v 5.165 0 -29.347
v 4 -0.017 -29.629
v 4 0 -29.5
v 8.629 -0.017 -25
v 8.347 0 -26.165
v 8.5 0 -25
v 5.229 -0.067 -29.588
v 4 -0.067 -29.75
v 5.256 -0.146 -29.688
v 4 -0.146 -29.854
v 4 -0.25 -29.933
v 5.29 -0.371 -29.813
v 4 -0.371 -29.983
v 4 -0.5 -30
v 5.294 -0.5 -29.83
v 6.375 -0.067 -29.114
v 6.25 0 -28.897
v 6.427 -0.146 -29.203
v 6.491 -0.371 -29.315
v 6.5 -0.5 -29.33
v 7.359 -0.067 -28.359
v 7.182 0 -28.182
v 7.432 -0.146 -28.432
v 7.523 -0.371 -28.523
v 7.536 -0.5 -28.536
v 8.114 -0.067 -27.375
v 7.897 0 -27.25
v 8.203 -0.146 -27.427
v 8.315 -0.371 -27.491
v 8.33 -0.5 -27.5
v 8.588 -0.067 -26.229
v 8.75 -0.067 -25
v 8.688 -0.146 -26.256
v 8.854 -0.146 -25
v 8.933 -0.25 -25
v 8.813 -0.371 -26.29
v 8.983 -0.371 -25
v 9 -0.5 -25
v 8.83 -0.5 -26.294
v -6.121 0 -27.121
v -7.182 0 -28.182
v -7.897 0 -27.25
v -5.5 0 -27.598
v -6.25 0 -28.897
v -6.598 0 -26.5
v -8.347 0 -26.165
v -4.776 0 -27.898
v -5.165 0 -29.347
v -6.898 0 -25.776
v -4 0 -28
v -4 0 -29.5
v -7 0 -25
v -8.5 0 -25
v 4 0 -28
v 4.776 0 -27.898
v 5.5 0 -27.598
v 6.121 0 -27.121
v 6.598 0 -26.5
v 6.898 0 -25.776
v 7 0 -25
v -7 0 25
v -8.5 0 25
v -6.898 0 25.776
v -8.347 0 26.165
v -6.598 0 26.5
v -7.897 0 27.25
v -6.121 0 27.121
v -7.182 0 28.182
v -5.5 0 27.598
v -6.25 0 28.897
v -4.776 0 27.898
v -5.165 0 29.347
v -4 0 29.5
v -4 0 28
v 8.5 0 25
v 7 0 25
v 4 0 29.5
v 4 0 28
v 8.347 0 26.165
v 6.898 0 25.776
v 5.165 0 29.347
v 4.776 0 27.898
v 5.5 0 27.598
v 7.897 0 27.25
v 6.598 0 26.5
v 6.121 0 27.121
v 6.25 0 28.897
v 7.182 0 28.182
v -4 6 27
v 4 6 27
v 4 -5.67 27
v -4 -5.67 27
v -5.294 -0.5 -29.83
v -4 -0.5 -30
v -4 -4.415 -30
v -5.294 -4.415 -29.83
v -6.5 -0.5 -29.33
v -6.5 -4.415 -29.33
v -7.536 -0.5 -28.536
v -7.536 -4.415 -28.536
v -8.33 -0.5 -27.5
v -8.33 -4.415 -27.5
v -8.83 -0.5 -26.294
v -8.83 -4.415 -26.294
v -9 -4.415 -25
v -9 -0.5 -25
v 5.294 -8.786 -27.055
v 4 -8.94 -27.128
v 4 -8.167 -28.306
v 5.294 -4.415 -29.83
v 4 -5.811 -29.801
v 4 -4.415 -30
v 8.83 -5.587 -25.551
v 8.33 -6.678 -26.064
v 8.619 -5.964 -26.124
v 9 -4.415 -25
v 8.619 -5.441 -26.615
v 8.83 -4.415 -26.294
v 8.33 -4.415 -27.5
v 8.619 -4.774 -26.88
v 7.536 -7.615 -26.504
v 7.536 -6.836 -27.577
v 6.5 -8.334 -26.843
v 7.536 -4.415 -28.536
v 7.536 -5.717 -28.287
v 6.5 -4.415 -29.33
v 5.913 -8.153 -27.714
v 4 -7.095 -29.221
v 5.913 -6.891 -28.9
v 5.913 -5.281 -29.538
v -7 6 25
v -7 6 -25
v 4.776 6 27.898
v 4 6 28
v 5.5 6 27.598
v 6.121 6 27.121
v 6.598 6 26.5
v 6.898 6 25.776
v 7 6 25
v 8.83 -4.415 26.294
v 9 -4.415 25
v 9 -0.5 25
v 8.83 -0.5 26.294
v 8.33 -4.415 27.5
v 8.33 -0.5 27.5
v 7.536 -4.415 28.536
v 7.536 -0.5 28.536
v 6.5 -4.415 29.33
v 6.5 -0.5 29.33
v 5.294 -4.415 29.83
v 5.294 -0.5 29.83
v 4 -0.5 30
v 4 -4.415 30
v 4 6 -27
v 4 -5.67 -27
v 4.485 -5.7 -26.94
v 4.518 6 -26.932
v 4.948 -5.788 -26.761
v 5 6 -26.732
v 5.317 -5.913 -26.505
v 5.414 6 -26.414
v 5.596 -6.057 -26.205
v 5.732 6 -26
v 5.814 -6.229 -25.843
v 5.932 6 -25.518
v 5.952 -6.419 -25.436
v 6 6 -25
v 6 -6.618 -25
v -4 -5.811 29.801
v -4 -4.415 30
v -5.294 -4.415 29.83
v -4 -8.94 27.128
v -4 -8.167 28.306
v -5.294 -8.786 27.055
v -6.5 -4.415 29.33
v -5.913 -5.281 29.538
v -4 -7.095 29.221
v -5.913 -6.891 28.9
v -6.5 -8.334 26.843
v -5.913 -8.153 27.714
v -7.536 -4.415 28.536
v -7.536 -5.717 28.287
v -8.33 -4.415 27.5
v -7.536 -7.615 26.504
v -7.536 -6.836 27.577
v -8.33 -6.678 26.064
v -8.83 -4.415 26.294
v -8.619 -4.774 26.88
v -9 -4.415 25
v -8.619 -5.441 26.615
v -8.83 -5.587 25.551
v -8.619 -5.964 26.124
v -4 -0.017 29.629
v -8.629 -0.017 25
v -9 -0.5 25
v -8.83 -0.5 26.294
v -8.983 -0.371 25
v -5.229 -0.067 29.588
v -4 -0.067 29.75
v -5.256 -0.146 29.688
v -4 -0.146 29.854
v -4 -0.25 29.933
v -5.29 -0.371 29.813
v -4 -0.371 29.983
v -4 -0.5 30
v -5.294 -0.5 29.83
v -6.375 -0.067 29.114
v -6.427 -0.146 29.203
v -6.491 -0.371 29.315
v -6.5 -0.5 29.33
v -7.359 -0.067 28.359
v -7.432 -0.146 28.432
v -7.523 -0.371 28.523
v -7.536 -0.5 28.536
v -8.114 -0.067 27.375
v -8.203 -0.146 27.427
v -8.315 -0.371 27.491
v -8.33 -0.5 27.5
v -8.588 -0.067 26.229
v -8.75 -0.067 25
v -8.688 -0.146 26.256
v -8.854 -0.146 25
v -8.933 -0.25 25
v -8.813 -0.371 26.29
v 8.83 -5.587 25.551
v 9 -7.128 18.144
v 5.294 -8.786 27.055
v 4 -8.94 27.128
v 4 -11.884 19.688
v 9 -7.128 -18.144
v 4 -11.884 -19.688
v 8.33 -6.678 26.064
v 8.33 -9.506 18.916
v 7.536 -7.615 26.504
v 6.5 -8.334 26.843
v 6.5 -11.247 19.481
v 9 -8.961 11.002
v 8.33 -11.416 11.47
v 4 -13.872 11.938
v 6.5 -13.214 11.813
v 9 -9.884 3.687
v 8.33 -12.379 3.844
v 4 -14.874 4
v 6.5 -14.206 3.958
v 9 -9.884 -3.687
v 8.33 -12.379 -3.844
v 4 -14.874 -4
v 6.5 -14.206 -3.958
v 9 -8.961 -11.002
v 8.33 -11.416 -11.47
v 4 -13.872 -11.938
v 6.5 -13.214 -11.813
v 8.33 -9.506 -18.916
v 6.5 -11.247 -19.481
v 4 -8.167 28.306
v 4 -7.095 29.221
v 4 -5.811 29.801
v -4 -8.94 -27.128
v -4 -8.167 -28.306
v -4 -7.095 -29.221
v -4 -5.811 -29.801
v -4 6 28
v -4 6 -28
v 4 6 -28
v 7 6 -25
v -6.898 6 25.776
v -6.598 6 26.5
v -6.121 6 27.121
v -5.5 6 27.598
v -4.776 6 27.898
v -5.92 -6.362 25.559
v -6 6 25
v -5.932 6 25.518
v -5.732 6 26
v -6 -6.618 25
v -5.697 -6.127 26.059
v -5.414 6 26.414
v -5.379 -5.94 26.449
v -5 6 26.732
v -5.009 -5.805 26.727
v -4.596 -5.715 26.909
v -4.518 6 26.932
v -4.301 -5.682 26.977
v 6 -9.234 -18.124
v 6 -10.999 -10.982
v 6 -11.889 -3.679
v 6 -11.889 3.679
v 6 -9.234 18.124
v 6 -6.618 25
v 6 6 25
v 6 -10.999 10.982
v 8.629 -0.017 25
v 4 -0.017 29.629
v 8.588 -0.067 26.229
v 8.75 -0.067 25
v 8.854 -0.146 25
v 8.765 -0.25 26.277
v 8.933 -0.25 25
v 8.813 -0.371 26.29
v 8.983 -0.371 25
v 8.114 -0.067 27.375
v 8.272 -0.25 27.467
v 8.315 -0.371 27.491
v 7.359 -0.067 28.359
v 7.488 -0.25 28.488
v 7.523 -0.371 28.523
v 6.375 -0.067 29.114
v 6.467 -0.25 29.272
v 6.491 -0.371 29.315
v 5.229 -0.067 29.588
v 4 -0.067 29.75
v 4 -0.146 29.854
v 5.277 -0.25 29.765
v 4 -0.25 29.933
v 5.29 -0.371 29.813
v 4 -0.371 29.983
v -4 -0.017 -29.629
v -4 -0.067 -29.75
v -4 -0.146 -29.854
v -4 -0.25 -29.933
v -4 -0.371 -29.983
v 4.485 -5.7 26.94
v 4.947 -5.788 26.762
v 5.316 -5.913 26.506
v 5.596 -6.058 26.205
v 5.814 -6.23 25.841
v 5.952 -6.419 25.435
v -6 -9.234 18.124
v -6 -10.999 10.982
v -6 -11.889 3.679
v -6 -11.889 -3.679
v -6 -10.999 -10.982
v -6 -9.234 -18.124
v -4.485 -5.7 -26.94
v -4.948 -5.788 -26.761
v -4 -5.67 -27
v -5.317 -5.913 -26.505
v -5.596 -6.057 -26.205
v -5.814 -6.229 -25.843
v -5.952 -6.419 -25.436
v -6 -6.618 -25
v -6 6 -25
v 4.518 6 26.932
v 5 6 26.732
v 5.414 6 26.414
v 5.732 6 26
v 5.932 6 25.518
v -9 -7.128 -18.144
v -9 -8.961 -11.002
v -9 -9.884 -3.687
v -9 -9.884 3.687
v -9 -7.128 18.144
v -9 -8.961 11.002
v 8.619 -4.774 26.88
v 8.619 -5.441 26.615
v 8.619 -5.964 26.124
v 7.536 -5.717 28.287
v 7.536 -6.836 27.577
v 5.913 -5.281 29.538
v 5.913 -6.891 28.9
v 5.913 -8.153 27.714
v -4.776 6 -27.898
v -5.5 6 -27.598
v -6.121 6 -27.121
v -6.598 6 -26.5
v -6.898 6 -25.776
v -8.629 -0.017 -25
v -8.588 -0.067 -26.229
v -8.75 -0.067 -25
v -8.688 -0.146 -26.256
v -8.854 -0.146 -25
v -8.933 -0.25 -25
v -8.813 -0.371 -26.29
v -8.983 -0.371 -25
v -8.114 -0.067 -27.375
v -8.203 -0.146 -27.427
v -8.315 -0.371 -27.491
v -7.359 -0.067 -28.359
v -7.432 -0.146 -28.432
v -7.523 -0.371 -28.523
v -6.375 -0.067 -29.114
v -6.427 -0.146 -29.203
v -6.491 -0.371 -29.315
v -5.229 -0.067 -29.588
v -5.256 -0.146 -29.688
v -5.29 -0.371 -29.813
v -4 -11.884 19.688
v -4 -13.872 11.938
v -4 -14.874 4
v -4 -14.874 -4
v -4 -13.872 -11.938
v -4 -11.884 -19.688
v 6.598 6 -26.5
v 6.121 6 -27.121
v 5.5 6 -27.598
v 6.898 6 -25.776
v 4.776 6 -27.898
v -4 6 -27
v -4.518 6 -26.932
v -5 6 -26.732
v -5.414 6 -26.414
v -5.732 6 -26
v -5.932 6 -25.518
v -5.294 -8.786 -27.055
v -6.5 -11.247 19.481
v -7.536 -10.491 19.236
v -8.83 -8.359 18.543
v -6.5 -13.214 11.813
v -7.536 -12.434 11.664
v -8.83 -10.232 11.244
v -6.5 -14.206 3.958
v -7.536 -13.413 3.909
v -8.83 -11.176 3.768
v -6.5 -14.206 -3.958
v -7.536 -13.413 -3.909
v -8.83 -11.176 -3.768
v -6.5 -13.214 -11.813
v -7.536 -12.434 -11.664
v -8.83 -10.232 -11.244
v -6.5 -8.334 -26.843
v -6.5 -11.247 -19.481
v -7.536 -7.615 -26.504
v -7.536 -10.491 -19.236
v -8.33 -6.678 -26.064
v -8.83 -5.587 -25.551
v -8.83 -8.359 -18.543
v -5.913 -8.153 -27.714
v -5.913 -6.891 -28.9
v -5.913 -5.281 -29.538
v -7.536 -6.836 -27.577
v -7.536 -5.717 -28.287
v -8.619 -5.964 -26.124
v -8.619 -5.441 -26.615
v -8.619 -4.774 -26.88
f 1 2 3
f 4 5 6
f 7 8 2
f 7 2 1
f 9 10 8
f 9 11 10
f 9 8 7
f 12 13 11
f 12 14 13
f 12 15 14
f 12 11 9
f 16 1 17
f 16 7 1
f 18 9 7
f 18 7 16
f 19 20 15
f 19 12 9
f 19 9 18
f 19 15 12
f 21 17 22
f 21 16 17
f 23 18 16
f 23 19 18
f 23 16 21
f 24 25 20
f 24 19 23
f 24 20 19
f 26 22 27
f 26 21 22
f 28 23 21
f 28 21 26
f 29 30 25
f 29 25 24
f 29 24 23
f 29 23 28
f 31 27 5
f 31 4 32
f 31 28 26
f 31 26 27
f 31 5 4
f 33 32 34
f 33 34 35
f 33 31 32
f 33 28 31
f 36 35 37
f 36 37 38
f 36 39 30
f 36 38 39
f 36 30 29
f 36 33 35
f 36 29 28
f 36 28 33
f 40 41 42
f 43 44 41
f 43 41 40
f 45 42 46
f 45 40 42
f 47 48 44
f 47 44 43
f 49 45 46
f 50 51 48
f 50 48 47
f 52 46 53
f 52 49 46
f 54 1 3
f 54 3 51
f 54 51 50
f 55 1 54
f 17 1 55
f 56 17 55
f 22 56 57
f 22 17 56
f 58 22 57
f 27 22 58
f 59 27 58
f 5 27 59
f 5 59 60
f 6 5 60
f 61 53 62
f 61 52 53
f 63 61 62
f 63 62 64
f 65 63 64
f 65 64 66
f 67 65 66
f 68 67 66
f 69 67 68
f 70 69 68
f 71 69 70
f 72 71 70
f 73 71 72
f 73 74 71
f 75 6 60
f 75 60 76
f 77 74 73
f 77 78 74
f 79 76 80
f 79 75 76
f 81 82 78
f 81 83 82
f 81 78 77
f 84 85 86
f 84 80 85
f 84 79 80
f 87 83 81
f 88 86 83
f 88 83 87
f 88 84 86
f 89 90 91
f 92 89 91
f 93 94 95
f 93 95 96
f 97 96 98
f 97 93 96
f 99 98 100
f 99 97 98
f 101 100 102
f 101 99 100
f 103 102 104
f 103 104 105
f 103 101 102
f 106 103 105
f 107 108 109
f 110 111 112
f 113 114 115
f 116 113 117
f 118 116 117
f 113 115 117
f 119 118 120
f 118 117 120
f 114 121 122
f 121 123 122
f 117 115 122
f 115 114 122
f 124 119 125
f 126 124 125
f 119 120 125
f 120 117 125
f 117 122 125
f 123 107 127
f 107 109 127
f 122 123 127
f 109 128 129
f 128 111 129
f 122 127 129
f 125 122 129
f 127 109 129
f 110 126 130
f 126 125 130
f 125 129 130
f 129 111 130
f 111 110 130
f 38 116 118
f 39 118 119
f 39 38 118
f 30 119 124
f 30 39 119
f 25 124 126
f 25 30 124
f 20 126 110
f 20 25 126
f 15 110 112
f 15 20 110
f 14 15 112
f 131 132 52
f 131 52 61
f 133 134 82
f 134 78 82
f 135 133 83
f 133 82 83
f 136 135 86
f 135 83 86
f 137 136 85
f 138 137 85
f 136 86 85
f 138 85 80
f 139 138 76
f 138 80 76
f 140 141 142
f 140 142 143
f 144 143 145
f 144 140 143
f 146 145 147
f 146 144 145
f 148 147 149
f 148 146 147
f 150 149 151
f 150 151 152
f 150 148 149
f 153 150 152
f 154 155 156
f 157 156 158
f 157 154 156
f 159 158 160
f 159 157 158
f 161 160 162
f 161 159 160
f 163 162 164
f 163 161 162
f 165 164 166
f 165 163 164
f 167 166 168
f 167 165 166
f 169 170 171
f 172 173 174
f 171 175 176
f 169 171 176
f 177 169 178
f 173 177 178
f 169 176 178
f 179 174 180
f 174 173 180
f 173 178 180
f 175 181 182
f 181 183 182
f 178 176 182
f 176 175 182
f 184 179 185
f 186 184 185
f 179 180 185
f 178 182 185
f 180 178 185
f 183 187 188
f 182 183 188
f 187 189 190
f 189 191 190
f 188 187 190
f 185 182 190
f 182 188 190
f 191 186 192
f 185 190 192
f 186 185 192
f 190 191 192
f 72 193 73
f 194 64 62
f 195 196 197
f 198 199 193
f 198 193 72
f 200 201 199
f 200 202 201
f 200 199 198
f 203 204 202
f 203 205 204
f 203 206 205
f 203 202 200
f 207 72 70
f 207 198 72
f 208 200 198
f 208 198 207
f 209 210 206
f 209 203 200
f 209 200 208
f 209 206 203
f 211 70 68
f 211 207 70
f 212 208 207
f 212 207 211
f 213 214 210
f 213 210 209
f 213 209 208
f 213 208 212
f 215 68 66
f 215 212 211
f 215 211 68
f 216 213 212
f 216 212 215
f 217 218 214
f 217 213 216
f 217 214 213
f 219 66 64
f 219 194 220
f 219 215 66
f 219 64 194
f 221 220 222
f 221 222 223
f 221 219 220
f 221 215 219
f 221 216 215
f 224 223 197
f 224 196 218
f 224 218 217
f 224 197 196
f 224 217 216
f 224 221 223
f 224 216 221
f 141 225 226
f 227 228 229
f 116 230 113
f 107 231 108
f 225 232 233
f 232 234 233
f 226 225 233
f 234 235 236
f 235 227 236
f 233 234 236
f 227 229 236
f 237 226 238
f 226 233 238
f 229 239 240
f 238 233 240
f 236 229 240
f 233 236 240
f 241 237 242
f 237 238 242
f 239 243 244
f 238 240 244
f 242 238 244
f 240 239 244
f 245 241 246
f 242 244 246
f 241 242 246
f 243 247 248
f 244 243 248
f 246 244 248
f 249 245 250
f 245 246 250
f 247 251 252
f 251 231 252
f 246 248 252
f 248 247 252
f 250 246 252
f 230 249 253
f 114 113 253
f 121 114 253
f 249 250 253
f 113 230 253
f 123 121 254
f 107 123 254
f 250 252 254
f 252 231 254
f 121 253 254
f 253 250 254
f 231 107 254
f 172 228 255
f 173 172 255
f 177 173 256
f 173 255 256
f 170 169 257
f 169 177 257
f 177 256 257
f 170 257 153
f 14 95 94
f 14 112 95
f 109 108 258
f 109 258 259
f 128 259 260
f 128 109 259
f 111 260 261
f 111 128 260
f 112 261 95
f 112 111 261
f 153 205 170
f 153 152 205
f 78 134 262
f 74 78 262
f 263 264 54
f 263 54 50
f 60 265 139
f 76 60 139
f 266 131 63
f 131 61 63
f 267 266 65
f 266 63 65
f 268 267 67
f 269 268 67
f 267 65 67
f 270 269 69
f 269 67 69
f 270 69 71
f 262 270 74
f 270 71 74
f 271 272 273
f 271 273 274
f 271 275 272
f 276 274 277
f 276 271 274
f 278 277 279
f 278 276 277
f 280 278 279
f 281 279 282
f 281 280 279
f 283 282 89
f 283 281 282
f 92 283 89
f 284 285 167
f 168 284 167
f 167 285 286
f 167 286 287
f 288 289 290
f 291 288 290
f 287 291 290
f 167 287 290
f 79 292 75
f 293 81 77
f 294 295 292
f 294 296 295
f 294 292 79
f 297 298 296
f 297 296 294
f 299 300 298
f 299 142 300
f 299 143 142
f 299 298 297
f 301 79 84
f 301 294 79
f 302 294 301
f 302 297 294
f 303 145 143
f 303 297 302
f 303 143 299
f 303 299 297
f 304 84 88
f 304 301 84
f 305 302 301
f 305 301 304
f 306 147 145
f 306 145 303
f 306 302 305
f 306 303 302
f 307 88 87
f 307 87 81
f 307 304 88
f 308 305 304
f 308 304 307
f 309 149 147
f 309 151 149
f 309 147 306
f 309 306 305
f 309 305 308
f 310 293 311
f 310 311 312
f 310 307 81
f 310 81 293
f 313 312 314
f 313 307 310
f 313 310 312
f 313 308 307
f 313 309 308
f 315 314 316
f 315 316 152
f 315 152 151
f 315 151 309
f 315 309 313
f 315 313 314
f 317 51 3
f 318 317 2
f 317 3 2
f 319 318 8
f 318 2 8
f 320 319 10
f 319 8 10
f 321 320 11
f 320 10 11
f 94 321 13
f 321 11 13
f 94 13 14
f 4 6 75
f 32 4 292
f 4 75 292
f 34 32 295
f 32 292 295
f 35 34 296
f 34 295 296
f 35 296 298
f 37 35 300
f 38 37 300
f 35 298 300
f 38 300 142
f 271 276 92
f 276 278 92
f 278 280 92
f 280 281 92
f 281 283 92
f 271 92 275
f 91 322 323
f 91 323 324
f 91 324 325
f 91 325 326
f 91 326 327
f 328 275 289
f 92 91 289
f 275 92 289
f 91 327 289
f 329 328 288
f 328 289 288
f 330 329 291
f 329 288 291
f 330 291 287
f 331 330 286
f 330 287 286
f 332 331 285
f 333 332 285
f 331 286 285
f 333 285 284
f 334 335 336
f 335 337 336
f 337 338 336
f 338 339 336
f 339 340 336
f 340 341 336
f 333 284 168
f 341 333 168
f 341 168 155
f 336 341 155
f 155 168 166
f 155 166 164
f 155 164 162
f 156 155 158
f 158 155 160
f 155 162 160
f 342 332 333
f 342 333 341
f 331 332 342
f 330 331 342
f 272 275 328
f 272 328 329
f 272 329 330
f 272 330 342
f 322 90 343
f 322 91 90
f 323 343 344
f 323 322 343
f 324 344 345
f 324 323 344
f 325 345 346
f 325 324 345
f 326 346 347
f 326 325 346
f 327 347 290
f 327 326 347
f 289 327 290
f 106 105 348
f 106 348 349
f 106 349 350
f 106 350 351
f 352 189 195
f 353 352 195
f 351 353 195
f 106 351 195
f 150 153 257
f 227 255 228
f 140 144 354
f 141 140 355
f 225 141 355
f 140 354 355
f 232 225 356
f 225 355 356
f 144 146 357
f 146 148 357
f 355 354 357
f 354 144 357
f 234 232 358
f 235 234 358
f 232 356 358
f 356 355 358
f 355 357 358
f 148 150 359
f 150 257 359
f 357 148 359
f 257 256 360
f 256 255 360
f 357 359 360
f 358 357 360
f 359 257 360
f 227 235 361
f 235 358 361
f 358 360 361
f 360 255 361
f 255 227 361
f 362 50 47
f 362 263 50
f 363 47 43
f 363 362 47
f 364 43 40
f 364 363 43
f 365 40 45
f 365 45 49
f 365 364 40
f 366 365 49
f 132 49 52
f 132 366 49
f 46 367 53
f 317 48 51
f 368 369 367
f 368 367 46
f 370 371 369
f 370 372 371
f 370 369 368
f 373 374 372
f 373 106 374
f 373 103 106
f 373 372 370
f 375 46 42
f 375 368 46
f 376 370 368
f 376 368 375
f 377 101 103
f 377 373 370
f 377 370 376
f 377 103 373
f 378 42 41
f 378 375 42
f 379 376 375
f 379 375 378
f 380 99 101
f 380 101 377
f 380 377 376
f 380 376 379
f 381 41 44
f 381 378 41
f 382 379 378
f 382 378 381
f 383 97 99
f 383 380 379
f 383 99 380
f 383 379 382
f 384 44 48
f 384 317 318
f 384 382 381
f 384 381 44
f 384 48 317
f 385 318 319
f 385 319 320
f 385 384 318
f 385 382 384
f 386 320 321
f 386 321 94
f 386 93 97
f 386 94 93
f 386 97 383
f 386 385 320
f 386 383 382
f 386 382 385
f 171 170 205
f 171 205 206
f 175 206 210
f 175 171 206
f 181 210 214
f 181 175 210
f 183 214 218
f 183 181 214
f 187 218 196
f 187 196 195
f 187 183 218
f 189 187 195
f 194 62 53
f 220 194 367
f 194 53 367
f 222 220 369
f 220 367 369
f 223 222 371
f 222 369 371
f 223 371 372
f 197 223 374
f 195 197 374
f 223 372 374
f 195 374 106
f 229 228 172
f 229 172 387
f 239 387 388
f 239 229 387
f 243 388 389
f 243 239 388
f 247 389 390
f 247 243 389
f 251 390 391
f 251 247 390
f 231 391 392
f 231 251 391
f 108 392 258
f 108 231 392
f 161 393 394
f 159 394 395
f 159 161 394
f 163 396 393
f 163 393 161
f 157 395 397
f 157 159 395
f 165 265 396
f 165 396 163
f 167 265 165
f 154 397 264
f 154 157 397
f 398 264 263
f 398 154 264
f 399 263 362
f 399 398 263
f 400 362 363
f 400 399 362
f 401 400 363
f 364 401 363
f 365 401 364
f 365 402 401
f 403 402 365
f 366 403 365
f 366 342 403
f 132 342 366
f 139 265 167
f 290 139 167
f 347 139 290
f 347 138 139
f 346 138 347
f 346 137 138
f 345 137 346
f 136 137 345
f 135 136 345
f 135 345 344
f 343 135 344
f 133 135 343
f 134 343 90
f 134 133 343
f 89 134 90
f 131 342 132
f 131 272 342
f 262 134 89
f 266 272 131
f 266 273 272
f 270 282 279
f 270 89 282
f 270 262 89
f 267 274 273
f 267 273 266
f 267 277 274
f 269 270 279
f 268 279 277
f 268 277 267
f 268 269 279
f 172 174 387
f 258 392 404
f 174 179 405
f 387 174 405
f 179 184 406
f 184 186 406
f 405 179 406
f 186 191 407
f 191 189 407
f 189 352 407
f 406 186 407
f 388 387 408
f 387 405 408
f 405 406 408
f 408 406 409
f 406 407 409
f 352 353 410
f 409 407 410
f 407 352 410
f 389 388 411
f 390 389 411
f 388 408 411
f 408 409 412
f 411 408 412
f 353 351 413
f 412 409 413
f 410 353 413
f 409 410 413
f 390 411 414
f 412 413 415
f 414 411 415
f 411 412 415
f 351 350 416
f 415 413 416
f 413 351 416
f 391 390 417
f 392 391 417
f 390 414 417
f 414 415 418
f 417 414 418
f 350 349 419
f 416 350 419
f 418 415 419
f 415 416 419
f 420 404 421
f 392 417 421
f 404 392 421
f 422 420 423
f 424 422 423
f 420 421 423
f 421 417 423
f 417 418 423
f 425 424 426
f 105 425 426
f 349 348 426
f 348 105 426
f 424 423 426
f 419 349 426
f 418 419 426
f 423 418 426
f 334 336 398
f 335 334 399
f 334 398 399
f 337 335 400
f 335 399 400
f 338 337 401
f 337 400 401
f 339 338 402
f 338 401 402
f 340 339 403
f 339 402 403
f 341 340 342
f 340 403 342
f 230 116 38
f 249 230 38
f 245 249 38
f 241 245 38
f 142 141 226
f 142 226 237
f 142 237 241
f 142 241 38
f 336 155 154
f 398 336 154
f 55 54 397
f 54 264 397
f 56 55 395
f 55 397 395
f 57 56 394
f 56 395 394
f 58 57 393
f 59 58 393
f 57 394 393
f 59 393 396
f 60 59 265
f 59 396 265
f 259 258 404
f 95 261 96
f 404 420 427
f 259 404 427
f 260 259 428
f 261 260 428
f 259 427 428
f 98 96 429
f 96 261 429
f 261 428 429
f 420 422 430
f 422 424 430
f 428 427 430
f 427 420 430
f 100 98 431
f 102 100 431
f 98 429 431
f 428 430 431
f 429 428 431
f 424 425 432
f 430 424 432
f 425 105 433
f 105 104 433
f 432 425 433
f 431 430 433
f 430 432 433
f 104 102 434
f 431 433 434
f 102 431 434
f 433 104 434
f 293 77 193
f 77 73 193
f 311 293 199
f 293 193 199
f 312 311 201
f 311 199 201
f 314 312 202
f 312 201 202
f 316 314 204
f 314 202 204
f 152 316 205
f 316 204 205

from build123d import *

# Parameters (mm, degrees)
BOSS_EXTRUDE1_DEPTH = 9
SHELL2_T            = -3
SKETCH3_W           = 14
SKETCH3_H           = 56
SKETCH3_W_2         = 12
SKETCH3_H_2         = 54
BOSS_EXTRUDE3_DEPTH = 6
FILLET1_R           = 5
FILLET5_R           = 5
FILLET8_R           = 0.5
FILLET9_R           = 3
FILLET10_R          = 2


with BuildPart() as part:
    # Sketch1 → Boss-Extrude1 (new, symmetric)
    with BuildSketch(Plane.YZ):
        with BuildLine():
            Line((0, 30), (-7.5, 30))
            ThreePointArc((-7.5, 30), (-15, 0), (-7.5, -30))
            Line((-7.5, -30), (0, -30))
            Line((0, -30), (0, 30))
        make_face()
    extrude(amount=BOSS_EXTRUDE1_DEPTH, both=True)

    # Shell2
    shell2_openings = [part.faces().sort_by_distance(p)[0] for p in [
        (0, 0, 0),
    ]]
    offset(amount=SHELL2_T, openings=shell2_openings, kind=Kind.INTERSECTION)

    # Sketch3 → Boss-Extrude3 (add, symmetric)
    with BuildSketch(Plane(origin=(0, 0, 0), x_dir=(-1, 0, 0), z_dir=(0, 1, 0))):
        Rectangle(SKETCH3_W, SKETCH3_H)
        Rectangle(SKETCH3_W_2, SKETCH3_H_2, mode=Mode.SUBTRACT)
    extrude(amount=BOSS_EXTRUDE3_DEPTH, both=True)

    # Fillet1
    fillet1_edges = [part.edges().sort_by_distance(p)[0] for p in [
        (0, -7.5, -30),
        (0, -7.5, 30),
    ]]
    fillet(fillet1_edges, radius=FILLET1_R)

    # Fillet5
    fillet5_edges = [part.edges().sort_by_distance(p)[0] for p in [
        (9, -2.207712898, 30),
        (-9, -2.207712898, -30),
        (9, -2.207712898, -30),
        (-9, -15, 0),
        (-9, -7.095136799, 29.221273379),
        (-9, -2.207712898, 30),
        (-9, -7.095136799, -29.221273379),
        (9, -15, 0),
        (9, -7.095136799, 29.221273379),
        (9, -7.095136799, -29.221273379),
    ]]
    fillet(fillet5_edges, radius=FILLET5_R)

    # Fillet8
    fillet8_edges = [part.edges().sort_by_distance(p)[0] for p in [
        (0, 0, 30),
        (-9, 0, 0),
        (9, 0, 0),
        (0, 0, -30),
        (7.535533906, 0, -28.535533906),
        (7.535533906, 0, 28.535533906),
        (-7.535533906, 0, -28.535533906),
        (-7.535533906, 0, 28.535533906),
    ]]
    fillet(fillet8_edges, radius=FILLET8_R)

    # Fillet9
    fillet9_edges = [part.edges().sort_by_distance(p)[0] for p in [
        (-7, 3, 28),
        (7, 3, 28),
        (7, 3, -28),
        (-7, 3, -28),
    ]]
    fillet(fillet9_edges, radius=FILLET9_R)

    # Fillet10
    fillet10_edges = [part.edges().sort_by_distance(p)[0] for p in [
        (-6, 0.164880099, 27),
        (-6, 0.164880099, -27),
        (6, 0.164880099, 27),
        (6, 0.164880099, -27),
    ]]
    fillet(fillet10_edges, radius=FILLET10_R)


solid = part.part
